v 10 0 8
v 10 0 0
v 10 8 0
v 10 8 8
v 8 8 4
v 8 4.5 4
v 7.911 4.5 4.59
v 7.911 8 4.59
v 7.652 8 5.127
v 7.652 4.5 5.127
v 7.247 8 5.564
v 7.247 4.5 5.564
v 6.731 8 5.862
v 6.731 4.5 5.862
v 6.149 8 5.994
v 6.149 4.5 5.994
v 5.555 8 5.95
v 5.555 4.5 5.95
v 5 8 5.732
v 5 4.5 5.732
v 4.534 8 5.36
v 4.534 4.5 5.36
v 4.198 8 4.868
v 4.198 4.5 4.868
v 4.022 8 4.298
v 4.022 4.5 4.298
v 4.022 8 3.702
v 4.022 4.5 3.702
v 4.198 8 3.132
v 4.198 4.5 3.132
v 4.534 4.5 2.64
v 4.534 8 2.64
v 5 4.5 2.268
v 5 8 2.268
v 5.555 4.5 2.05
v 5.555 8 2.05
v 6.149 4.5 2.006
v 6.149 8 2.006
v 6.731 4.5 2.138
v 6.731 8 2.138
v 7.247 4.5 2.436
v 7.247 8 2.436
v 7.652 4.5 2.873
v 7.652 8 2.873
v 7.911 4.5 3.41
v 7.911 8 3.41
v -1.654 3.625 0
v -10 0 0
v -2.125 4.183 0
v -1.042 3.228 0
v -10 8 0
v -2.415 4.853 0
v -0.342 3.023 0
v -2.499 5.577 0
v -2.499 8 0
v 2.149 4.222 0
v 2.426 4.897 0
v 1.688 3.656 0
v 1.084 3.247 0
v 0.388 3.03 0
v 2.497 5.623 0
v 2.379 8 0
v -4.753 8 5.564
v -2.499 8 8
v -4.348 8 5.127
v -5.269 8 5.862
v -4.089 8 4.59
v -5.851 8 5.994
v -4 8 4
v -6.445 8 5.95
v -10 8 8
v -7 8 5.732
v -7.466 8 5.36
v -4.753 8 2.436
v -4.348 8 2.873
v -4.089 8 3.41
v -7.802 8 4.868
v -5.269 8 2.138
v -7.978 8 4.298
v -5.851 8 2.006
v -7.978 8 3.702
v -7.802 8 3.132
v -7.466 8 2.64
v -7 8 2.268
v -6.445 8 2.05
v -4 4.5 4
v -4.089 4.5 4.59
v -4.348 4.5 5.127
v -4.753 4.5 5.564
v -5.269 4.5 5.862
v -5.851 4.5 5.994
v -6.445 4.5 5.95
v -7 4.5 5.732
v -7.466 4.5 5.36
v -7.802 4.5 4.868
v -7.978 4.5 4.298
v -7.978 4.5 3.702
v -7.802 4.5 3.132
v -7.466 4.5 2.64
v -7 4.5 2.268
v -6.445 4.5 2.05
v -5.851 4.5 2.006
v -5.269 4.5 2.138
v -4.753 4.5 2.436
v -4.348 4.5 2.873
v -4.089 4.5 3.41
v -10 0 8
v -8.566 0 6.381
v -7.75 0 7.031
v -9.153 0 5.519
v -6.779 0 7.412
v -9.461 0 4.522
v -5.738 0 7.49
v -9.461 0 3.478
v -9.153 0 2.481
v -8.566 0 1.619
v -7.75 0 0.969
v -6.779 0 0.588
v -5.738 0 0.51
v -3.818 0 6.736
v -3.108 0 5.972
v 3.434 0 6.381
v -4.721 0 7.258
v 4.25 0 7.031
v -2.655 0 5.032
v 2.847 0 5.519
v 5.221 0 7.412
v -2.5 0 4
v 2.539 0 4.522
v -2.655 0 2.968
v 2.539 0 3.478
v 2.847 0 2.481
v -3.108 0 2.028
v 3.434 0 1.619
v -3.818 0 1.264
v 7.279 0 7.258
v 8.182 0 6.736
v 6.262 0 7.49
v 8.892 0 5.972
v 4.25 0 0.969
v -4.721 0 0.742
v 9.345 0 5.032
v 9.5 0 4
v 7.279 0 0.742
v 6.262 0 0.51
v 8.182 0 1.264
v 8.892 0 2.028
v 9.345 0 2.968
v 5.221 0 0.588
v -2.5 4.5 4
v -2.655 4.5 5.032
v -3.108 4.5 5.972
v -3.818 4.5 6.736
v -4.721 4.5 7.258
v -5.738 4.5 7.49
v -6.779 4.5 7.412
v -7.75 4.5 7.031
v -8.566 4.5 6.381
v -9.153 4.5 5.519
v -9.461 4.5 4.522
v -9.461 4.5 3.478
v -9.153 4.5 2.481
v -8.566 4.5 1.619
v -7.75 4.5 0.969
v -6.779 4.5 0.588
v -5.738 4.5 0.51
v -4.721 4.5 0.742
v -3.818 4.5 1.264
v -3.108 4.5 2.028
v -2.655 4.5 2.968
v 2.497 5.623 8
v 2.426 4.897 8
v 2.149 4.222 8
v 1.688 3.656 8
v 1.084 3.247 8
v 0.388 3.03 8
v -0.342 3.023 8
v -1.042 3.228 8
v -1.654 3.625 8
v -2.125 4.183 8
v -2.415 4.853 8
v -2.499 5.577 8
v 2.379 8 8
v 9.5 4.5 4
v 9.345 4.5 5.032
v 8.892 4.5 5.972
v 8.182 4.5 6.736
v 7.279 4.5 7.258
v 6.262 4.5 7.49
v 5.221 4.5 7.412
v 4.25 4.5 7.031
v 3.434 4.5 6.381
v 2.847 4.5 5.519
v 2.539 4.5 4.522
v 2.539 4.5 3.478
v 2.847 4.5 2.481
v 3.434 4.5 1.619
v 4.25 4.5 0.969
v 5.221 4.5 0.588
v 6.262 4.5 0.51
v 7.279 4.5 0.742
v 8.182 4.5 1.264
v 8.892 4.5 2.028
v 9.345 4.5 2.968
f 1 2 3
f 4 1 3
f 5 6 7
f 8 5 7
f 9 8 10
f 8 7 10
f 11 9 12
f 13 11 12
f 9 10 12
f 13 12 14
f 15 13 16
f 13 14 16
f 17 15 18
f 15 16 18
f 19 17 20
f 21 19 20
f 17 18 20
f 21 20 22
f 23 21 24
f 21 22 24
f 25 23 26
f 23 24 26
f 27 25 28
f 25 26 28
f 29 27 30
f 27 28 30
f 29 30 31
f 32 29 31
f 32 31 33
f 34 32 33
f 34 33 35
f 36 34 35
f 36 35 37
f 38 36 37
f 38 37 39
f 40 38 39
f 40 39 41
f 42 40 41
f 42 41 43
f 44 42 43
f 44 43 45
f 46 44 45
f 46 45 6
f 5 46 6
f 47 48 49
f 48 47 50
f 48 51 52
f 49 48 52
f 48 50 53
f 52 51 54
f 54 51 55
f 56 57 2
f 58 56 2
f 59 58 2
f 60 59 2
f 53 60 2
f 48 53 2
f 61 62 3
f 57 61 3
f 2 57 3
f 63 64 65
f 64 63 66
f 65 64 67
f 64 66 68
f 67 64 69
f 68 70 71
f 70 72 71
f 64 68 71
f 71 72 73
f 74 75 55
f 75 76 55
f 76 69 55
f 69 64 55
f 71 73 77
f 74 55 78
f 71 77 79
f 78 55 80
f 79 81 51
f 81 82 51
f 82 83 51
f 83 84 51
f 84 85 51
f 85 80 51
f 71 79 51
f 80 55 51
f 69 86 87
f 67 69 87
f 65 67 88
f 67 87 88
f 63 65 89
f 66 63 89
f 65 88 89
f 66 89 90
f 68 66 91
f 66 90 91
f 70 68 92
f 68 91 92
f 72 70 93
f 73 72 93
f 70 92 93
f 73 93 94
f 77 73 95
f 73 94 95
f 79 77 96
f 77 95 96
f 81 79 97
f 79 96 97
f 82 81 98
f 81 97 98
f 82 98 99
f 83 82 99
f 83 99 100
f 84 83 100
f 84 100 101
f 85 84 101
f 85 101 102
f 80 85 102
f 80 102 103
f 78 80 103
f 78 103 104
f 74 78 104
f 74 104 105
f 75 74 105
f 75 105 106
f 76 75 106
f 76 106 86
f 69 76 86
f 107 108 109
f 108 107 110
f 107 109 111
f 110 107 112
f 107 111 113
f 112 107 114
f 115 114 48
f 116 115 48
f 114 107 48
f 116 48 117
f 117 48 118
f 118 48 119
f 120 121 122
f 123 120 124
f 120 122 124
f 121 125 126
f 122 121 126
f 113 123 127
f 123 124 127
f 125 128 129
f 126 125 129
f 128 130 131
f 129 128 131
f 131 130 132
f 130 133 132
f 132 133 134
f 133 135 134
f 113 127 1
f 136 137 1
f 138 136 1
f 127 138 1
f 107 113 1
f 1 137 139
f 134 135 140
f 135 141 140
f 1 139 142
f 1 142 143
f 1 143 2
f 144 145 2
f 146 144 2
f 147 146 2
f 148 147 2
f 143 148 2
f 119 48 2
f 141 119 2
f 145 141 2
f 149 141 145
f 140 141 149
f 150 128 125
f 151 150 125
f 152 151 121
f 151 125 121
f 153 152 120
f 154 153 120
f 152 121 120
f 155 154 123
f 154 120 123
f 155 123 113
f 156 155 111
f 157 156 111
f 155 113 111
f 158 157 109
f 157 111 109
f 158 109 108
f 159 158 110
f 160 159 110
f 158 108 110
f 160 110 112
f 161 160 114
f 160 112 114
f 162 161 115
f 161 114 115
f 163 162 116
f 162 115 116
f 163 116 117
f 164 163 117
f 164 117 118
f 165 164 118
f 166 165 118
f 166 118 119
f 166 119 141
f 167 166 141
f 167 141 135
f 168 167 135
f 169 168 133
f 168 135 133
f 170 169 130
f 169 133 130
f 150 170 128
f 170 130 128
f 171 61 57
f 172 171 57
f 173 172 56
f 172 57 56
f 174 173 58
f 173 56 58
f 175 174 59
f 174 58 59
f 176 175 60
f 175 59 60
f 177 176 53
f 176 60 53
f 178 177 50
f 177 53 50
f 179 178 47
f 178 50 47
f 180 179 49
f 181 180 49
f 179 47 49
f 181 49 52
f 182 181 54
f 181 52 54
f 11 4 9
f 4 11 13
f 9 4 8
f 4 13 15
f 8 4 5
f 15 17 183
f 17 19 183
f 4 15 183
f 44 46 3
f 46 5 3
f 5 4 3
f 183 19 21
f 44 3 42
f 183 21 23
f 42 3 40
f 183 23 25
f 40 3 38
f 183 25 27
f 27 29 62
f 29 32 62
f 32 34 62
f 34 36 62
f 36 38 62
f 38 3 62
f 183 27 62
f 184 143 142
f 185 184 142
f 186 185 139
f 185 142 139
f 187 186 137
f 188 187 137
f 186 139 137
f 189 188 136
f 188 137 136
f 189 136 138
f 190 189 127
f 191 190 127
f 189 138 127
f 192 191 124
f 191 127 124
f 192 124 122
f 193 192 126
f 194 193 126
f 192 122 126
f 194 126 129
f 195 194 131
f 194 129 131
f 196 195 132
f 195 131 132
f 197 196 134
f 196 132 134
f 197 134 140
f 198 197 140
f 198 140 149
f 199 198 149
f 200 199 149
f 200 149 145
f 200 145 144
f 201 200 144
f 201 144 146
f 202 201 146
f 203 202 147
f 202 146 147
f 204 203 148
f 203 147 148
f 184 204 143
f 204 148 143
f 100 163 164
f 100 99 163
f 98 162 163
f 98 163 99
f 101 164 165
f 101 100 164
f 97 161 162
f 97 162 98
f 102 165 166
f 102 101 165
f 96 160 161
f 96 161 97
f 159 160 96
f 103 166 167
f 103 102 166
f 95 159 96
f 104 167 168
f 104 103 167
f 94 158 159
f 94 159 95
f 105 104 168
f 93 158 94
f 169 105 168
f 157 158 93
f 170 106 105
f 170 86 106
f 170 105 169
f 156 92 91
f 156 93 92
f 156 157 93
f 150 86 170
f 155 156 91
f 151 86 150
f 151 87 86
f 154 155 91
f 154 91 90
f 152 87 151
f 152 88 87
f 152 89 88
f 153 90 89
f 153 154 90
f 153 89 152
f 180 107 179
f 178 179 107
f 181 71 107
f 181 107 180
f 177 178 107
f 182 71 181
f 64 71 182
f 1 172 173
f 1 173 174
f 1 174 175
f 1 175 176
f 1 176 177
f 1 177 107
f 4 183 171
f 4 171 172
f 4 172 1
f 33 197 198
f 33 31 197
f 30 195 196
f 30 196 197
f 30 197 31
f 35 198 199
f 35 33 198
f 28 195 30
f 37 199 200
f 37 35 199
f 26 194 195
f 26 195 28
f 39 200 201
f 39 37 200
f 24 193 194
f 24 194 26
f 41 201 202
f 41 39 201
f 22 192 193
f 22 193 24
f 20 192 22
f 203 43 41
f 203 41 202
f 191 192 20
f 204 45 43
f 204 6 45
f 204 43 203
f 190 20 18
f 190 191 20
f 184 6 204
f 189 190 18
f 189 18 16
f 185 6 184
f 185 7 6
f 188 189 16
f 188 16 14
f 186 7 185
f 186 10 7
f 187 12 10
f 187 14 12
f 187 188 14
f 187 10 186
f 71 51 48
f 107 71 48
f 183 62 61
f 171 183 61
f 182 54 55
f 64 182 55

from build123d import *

# Parameters (mm, degrees)
F1_DEPTH = 8
F2_R     = 3.5
F3_DEPTH = 4.5
F4_R     = 2
F5_R     = 2
F6_DEPTH = 25


with BuildPart() as f1:
    # F0 (on Top) → F1 (new body)
    with BuildSketch(Plane.XY):
        with BuildLine():
            Line((-2.498805, 8), (-10, 8))
            Line((-10, 8), (-10, 0))
            Line((-10, 0), (10, 0))
            Line((10, 0), (10, 8))
            Line((10, 8), (2.379432, 8))
            Line((2.379432, 8), (2.496949, 5.623472))
            ThreePointArc((2.496949, 5.623472), (0.023112, 3.000107), (-2.498805, 5.577284))
            Line((-2.498805, 5.577284), (-2.498805, 8))
        make_face()
    extrude(amount=F1_DEPTH)

    # F2 (on face) → F3 (cut)
    with BuildSketch(Plane.XZ):
        with Locations((6, 4)):
            Circle(F2_R)
        with Locations((-6, 4)):
            Circle(F2_R)
    extrude(amount=-F3_DEPTH, mode=Mode.SUBTRACT)

    # F4 (on face) + F5 (on face) → F6 (cut)
    with BuildSketch(Plane.XZ.offset(-4.5)):
        with Locations((-6, 4)):
            Circle(F4_R)
    with BuildSketch(Plane.XZ.offset(-4.5)):
        with Locations((6, 4)):
            Circle(F5_R)
    extrude(amount=-F6_DEPTH, mode=Mode.SUBTRACT)


solid = f1.part
